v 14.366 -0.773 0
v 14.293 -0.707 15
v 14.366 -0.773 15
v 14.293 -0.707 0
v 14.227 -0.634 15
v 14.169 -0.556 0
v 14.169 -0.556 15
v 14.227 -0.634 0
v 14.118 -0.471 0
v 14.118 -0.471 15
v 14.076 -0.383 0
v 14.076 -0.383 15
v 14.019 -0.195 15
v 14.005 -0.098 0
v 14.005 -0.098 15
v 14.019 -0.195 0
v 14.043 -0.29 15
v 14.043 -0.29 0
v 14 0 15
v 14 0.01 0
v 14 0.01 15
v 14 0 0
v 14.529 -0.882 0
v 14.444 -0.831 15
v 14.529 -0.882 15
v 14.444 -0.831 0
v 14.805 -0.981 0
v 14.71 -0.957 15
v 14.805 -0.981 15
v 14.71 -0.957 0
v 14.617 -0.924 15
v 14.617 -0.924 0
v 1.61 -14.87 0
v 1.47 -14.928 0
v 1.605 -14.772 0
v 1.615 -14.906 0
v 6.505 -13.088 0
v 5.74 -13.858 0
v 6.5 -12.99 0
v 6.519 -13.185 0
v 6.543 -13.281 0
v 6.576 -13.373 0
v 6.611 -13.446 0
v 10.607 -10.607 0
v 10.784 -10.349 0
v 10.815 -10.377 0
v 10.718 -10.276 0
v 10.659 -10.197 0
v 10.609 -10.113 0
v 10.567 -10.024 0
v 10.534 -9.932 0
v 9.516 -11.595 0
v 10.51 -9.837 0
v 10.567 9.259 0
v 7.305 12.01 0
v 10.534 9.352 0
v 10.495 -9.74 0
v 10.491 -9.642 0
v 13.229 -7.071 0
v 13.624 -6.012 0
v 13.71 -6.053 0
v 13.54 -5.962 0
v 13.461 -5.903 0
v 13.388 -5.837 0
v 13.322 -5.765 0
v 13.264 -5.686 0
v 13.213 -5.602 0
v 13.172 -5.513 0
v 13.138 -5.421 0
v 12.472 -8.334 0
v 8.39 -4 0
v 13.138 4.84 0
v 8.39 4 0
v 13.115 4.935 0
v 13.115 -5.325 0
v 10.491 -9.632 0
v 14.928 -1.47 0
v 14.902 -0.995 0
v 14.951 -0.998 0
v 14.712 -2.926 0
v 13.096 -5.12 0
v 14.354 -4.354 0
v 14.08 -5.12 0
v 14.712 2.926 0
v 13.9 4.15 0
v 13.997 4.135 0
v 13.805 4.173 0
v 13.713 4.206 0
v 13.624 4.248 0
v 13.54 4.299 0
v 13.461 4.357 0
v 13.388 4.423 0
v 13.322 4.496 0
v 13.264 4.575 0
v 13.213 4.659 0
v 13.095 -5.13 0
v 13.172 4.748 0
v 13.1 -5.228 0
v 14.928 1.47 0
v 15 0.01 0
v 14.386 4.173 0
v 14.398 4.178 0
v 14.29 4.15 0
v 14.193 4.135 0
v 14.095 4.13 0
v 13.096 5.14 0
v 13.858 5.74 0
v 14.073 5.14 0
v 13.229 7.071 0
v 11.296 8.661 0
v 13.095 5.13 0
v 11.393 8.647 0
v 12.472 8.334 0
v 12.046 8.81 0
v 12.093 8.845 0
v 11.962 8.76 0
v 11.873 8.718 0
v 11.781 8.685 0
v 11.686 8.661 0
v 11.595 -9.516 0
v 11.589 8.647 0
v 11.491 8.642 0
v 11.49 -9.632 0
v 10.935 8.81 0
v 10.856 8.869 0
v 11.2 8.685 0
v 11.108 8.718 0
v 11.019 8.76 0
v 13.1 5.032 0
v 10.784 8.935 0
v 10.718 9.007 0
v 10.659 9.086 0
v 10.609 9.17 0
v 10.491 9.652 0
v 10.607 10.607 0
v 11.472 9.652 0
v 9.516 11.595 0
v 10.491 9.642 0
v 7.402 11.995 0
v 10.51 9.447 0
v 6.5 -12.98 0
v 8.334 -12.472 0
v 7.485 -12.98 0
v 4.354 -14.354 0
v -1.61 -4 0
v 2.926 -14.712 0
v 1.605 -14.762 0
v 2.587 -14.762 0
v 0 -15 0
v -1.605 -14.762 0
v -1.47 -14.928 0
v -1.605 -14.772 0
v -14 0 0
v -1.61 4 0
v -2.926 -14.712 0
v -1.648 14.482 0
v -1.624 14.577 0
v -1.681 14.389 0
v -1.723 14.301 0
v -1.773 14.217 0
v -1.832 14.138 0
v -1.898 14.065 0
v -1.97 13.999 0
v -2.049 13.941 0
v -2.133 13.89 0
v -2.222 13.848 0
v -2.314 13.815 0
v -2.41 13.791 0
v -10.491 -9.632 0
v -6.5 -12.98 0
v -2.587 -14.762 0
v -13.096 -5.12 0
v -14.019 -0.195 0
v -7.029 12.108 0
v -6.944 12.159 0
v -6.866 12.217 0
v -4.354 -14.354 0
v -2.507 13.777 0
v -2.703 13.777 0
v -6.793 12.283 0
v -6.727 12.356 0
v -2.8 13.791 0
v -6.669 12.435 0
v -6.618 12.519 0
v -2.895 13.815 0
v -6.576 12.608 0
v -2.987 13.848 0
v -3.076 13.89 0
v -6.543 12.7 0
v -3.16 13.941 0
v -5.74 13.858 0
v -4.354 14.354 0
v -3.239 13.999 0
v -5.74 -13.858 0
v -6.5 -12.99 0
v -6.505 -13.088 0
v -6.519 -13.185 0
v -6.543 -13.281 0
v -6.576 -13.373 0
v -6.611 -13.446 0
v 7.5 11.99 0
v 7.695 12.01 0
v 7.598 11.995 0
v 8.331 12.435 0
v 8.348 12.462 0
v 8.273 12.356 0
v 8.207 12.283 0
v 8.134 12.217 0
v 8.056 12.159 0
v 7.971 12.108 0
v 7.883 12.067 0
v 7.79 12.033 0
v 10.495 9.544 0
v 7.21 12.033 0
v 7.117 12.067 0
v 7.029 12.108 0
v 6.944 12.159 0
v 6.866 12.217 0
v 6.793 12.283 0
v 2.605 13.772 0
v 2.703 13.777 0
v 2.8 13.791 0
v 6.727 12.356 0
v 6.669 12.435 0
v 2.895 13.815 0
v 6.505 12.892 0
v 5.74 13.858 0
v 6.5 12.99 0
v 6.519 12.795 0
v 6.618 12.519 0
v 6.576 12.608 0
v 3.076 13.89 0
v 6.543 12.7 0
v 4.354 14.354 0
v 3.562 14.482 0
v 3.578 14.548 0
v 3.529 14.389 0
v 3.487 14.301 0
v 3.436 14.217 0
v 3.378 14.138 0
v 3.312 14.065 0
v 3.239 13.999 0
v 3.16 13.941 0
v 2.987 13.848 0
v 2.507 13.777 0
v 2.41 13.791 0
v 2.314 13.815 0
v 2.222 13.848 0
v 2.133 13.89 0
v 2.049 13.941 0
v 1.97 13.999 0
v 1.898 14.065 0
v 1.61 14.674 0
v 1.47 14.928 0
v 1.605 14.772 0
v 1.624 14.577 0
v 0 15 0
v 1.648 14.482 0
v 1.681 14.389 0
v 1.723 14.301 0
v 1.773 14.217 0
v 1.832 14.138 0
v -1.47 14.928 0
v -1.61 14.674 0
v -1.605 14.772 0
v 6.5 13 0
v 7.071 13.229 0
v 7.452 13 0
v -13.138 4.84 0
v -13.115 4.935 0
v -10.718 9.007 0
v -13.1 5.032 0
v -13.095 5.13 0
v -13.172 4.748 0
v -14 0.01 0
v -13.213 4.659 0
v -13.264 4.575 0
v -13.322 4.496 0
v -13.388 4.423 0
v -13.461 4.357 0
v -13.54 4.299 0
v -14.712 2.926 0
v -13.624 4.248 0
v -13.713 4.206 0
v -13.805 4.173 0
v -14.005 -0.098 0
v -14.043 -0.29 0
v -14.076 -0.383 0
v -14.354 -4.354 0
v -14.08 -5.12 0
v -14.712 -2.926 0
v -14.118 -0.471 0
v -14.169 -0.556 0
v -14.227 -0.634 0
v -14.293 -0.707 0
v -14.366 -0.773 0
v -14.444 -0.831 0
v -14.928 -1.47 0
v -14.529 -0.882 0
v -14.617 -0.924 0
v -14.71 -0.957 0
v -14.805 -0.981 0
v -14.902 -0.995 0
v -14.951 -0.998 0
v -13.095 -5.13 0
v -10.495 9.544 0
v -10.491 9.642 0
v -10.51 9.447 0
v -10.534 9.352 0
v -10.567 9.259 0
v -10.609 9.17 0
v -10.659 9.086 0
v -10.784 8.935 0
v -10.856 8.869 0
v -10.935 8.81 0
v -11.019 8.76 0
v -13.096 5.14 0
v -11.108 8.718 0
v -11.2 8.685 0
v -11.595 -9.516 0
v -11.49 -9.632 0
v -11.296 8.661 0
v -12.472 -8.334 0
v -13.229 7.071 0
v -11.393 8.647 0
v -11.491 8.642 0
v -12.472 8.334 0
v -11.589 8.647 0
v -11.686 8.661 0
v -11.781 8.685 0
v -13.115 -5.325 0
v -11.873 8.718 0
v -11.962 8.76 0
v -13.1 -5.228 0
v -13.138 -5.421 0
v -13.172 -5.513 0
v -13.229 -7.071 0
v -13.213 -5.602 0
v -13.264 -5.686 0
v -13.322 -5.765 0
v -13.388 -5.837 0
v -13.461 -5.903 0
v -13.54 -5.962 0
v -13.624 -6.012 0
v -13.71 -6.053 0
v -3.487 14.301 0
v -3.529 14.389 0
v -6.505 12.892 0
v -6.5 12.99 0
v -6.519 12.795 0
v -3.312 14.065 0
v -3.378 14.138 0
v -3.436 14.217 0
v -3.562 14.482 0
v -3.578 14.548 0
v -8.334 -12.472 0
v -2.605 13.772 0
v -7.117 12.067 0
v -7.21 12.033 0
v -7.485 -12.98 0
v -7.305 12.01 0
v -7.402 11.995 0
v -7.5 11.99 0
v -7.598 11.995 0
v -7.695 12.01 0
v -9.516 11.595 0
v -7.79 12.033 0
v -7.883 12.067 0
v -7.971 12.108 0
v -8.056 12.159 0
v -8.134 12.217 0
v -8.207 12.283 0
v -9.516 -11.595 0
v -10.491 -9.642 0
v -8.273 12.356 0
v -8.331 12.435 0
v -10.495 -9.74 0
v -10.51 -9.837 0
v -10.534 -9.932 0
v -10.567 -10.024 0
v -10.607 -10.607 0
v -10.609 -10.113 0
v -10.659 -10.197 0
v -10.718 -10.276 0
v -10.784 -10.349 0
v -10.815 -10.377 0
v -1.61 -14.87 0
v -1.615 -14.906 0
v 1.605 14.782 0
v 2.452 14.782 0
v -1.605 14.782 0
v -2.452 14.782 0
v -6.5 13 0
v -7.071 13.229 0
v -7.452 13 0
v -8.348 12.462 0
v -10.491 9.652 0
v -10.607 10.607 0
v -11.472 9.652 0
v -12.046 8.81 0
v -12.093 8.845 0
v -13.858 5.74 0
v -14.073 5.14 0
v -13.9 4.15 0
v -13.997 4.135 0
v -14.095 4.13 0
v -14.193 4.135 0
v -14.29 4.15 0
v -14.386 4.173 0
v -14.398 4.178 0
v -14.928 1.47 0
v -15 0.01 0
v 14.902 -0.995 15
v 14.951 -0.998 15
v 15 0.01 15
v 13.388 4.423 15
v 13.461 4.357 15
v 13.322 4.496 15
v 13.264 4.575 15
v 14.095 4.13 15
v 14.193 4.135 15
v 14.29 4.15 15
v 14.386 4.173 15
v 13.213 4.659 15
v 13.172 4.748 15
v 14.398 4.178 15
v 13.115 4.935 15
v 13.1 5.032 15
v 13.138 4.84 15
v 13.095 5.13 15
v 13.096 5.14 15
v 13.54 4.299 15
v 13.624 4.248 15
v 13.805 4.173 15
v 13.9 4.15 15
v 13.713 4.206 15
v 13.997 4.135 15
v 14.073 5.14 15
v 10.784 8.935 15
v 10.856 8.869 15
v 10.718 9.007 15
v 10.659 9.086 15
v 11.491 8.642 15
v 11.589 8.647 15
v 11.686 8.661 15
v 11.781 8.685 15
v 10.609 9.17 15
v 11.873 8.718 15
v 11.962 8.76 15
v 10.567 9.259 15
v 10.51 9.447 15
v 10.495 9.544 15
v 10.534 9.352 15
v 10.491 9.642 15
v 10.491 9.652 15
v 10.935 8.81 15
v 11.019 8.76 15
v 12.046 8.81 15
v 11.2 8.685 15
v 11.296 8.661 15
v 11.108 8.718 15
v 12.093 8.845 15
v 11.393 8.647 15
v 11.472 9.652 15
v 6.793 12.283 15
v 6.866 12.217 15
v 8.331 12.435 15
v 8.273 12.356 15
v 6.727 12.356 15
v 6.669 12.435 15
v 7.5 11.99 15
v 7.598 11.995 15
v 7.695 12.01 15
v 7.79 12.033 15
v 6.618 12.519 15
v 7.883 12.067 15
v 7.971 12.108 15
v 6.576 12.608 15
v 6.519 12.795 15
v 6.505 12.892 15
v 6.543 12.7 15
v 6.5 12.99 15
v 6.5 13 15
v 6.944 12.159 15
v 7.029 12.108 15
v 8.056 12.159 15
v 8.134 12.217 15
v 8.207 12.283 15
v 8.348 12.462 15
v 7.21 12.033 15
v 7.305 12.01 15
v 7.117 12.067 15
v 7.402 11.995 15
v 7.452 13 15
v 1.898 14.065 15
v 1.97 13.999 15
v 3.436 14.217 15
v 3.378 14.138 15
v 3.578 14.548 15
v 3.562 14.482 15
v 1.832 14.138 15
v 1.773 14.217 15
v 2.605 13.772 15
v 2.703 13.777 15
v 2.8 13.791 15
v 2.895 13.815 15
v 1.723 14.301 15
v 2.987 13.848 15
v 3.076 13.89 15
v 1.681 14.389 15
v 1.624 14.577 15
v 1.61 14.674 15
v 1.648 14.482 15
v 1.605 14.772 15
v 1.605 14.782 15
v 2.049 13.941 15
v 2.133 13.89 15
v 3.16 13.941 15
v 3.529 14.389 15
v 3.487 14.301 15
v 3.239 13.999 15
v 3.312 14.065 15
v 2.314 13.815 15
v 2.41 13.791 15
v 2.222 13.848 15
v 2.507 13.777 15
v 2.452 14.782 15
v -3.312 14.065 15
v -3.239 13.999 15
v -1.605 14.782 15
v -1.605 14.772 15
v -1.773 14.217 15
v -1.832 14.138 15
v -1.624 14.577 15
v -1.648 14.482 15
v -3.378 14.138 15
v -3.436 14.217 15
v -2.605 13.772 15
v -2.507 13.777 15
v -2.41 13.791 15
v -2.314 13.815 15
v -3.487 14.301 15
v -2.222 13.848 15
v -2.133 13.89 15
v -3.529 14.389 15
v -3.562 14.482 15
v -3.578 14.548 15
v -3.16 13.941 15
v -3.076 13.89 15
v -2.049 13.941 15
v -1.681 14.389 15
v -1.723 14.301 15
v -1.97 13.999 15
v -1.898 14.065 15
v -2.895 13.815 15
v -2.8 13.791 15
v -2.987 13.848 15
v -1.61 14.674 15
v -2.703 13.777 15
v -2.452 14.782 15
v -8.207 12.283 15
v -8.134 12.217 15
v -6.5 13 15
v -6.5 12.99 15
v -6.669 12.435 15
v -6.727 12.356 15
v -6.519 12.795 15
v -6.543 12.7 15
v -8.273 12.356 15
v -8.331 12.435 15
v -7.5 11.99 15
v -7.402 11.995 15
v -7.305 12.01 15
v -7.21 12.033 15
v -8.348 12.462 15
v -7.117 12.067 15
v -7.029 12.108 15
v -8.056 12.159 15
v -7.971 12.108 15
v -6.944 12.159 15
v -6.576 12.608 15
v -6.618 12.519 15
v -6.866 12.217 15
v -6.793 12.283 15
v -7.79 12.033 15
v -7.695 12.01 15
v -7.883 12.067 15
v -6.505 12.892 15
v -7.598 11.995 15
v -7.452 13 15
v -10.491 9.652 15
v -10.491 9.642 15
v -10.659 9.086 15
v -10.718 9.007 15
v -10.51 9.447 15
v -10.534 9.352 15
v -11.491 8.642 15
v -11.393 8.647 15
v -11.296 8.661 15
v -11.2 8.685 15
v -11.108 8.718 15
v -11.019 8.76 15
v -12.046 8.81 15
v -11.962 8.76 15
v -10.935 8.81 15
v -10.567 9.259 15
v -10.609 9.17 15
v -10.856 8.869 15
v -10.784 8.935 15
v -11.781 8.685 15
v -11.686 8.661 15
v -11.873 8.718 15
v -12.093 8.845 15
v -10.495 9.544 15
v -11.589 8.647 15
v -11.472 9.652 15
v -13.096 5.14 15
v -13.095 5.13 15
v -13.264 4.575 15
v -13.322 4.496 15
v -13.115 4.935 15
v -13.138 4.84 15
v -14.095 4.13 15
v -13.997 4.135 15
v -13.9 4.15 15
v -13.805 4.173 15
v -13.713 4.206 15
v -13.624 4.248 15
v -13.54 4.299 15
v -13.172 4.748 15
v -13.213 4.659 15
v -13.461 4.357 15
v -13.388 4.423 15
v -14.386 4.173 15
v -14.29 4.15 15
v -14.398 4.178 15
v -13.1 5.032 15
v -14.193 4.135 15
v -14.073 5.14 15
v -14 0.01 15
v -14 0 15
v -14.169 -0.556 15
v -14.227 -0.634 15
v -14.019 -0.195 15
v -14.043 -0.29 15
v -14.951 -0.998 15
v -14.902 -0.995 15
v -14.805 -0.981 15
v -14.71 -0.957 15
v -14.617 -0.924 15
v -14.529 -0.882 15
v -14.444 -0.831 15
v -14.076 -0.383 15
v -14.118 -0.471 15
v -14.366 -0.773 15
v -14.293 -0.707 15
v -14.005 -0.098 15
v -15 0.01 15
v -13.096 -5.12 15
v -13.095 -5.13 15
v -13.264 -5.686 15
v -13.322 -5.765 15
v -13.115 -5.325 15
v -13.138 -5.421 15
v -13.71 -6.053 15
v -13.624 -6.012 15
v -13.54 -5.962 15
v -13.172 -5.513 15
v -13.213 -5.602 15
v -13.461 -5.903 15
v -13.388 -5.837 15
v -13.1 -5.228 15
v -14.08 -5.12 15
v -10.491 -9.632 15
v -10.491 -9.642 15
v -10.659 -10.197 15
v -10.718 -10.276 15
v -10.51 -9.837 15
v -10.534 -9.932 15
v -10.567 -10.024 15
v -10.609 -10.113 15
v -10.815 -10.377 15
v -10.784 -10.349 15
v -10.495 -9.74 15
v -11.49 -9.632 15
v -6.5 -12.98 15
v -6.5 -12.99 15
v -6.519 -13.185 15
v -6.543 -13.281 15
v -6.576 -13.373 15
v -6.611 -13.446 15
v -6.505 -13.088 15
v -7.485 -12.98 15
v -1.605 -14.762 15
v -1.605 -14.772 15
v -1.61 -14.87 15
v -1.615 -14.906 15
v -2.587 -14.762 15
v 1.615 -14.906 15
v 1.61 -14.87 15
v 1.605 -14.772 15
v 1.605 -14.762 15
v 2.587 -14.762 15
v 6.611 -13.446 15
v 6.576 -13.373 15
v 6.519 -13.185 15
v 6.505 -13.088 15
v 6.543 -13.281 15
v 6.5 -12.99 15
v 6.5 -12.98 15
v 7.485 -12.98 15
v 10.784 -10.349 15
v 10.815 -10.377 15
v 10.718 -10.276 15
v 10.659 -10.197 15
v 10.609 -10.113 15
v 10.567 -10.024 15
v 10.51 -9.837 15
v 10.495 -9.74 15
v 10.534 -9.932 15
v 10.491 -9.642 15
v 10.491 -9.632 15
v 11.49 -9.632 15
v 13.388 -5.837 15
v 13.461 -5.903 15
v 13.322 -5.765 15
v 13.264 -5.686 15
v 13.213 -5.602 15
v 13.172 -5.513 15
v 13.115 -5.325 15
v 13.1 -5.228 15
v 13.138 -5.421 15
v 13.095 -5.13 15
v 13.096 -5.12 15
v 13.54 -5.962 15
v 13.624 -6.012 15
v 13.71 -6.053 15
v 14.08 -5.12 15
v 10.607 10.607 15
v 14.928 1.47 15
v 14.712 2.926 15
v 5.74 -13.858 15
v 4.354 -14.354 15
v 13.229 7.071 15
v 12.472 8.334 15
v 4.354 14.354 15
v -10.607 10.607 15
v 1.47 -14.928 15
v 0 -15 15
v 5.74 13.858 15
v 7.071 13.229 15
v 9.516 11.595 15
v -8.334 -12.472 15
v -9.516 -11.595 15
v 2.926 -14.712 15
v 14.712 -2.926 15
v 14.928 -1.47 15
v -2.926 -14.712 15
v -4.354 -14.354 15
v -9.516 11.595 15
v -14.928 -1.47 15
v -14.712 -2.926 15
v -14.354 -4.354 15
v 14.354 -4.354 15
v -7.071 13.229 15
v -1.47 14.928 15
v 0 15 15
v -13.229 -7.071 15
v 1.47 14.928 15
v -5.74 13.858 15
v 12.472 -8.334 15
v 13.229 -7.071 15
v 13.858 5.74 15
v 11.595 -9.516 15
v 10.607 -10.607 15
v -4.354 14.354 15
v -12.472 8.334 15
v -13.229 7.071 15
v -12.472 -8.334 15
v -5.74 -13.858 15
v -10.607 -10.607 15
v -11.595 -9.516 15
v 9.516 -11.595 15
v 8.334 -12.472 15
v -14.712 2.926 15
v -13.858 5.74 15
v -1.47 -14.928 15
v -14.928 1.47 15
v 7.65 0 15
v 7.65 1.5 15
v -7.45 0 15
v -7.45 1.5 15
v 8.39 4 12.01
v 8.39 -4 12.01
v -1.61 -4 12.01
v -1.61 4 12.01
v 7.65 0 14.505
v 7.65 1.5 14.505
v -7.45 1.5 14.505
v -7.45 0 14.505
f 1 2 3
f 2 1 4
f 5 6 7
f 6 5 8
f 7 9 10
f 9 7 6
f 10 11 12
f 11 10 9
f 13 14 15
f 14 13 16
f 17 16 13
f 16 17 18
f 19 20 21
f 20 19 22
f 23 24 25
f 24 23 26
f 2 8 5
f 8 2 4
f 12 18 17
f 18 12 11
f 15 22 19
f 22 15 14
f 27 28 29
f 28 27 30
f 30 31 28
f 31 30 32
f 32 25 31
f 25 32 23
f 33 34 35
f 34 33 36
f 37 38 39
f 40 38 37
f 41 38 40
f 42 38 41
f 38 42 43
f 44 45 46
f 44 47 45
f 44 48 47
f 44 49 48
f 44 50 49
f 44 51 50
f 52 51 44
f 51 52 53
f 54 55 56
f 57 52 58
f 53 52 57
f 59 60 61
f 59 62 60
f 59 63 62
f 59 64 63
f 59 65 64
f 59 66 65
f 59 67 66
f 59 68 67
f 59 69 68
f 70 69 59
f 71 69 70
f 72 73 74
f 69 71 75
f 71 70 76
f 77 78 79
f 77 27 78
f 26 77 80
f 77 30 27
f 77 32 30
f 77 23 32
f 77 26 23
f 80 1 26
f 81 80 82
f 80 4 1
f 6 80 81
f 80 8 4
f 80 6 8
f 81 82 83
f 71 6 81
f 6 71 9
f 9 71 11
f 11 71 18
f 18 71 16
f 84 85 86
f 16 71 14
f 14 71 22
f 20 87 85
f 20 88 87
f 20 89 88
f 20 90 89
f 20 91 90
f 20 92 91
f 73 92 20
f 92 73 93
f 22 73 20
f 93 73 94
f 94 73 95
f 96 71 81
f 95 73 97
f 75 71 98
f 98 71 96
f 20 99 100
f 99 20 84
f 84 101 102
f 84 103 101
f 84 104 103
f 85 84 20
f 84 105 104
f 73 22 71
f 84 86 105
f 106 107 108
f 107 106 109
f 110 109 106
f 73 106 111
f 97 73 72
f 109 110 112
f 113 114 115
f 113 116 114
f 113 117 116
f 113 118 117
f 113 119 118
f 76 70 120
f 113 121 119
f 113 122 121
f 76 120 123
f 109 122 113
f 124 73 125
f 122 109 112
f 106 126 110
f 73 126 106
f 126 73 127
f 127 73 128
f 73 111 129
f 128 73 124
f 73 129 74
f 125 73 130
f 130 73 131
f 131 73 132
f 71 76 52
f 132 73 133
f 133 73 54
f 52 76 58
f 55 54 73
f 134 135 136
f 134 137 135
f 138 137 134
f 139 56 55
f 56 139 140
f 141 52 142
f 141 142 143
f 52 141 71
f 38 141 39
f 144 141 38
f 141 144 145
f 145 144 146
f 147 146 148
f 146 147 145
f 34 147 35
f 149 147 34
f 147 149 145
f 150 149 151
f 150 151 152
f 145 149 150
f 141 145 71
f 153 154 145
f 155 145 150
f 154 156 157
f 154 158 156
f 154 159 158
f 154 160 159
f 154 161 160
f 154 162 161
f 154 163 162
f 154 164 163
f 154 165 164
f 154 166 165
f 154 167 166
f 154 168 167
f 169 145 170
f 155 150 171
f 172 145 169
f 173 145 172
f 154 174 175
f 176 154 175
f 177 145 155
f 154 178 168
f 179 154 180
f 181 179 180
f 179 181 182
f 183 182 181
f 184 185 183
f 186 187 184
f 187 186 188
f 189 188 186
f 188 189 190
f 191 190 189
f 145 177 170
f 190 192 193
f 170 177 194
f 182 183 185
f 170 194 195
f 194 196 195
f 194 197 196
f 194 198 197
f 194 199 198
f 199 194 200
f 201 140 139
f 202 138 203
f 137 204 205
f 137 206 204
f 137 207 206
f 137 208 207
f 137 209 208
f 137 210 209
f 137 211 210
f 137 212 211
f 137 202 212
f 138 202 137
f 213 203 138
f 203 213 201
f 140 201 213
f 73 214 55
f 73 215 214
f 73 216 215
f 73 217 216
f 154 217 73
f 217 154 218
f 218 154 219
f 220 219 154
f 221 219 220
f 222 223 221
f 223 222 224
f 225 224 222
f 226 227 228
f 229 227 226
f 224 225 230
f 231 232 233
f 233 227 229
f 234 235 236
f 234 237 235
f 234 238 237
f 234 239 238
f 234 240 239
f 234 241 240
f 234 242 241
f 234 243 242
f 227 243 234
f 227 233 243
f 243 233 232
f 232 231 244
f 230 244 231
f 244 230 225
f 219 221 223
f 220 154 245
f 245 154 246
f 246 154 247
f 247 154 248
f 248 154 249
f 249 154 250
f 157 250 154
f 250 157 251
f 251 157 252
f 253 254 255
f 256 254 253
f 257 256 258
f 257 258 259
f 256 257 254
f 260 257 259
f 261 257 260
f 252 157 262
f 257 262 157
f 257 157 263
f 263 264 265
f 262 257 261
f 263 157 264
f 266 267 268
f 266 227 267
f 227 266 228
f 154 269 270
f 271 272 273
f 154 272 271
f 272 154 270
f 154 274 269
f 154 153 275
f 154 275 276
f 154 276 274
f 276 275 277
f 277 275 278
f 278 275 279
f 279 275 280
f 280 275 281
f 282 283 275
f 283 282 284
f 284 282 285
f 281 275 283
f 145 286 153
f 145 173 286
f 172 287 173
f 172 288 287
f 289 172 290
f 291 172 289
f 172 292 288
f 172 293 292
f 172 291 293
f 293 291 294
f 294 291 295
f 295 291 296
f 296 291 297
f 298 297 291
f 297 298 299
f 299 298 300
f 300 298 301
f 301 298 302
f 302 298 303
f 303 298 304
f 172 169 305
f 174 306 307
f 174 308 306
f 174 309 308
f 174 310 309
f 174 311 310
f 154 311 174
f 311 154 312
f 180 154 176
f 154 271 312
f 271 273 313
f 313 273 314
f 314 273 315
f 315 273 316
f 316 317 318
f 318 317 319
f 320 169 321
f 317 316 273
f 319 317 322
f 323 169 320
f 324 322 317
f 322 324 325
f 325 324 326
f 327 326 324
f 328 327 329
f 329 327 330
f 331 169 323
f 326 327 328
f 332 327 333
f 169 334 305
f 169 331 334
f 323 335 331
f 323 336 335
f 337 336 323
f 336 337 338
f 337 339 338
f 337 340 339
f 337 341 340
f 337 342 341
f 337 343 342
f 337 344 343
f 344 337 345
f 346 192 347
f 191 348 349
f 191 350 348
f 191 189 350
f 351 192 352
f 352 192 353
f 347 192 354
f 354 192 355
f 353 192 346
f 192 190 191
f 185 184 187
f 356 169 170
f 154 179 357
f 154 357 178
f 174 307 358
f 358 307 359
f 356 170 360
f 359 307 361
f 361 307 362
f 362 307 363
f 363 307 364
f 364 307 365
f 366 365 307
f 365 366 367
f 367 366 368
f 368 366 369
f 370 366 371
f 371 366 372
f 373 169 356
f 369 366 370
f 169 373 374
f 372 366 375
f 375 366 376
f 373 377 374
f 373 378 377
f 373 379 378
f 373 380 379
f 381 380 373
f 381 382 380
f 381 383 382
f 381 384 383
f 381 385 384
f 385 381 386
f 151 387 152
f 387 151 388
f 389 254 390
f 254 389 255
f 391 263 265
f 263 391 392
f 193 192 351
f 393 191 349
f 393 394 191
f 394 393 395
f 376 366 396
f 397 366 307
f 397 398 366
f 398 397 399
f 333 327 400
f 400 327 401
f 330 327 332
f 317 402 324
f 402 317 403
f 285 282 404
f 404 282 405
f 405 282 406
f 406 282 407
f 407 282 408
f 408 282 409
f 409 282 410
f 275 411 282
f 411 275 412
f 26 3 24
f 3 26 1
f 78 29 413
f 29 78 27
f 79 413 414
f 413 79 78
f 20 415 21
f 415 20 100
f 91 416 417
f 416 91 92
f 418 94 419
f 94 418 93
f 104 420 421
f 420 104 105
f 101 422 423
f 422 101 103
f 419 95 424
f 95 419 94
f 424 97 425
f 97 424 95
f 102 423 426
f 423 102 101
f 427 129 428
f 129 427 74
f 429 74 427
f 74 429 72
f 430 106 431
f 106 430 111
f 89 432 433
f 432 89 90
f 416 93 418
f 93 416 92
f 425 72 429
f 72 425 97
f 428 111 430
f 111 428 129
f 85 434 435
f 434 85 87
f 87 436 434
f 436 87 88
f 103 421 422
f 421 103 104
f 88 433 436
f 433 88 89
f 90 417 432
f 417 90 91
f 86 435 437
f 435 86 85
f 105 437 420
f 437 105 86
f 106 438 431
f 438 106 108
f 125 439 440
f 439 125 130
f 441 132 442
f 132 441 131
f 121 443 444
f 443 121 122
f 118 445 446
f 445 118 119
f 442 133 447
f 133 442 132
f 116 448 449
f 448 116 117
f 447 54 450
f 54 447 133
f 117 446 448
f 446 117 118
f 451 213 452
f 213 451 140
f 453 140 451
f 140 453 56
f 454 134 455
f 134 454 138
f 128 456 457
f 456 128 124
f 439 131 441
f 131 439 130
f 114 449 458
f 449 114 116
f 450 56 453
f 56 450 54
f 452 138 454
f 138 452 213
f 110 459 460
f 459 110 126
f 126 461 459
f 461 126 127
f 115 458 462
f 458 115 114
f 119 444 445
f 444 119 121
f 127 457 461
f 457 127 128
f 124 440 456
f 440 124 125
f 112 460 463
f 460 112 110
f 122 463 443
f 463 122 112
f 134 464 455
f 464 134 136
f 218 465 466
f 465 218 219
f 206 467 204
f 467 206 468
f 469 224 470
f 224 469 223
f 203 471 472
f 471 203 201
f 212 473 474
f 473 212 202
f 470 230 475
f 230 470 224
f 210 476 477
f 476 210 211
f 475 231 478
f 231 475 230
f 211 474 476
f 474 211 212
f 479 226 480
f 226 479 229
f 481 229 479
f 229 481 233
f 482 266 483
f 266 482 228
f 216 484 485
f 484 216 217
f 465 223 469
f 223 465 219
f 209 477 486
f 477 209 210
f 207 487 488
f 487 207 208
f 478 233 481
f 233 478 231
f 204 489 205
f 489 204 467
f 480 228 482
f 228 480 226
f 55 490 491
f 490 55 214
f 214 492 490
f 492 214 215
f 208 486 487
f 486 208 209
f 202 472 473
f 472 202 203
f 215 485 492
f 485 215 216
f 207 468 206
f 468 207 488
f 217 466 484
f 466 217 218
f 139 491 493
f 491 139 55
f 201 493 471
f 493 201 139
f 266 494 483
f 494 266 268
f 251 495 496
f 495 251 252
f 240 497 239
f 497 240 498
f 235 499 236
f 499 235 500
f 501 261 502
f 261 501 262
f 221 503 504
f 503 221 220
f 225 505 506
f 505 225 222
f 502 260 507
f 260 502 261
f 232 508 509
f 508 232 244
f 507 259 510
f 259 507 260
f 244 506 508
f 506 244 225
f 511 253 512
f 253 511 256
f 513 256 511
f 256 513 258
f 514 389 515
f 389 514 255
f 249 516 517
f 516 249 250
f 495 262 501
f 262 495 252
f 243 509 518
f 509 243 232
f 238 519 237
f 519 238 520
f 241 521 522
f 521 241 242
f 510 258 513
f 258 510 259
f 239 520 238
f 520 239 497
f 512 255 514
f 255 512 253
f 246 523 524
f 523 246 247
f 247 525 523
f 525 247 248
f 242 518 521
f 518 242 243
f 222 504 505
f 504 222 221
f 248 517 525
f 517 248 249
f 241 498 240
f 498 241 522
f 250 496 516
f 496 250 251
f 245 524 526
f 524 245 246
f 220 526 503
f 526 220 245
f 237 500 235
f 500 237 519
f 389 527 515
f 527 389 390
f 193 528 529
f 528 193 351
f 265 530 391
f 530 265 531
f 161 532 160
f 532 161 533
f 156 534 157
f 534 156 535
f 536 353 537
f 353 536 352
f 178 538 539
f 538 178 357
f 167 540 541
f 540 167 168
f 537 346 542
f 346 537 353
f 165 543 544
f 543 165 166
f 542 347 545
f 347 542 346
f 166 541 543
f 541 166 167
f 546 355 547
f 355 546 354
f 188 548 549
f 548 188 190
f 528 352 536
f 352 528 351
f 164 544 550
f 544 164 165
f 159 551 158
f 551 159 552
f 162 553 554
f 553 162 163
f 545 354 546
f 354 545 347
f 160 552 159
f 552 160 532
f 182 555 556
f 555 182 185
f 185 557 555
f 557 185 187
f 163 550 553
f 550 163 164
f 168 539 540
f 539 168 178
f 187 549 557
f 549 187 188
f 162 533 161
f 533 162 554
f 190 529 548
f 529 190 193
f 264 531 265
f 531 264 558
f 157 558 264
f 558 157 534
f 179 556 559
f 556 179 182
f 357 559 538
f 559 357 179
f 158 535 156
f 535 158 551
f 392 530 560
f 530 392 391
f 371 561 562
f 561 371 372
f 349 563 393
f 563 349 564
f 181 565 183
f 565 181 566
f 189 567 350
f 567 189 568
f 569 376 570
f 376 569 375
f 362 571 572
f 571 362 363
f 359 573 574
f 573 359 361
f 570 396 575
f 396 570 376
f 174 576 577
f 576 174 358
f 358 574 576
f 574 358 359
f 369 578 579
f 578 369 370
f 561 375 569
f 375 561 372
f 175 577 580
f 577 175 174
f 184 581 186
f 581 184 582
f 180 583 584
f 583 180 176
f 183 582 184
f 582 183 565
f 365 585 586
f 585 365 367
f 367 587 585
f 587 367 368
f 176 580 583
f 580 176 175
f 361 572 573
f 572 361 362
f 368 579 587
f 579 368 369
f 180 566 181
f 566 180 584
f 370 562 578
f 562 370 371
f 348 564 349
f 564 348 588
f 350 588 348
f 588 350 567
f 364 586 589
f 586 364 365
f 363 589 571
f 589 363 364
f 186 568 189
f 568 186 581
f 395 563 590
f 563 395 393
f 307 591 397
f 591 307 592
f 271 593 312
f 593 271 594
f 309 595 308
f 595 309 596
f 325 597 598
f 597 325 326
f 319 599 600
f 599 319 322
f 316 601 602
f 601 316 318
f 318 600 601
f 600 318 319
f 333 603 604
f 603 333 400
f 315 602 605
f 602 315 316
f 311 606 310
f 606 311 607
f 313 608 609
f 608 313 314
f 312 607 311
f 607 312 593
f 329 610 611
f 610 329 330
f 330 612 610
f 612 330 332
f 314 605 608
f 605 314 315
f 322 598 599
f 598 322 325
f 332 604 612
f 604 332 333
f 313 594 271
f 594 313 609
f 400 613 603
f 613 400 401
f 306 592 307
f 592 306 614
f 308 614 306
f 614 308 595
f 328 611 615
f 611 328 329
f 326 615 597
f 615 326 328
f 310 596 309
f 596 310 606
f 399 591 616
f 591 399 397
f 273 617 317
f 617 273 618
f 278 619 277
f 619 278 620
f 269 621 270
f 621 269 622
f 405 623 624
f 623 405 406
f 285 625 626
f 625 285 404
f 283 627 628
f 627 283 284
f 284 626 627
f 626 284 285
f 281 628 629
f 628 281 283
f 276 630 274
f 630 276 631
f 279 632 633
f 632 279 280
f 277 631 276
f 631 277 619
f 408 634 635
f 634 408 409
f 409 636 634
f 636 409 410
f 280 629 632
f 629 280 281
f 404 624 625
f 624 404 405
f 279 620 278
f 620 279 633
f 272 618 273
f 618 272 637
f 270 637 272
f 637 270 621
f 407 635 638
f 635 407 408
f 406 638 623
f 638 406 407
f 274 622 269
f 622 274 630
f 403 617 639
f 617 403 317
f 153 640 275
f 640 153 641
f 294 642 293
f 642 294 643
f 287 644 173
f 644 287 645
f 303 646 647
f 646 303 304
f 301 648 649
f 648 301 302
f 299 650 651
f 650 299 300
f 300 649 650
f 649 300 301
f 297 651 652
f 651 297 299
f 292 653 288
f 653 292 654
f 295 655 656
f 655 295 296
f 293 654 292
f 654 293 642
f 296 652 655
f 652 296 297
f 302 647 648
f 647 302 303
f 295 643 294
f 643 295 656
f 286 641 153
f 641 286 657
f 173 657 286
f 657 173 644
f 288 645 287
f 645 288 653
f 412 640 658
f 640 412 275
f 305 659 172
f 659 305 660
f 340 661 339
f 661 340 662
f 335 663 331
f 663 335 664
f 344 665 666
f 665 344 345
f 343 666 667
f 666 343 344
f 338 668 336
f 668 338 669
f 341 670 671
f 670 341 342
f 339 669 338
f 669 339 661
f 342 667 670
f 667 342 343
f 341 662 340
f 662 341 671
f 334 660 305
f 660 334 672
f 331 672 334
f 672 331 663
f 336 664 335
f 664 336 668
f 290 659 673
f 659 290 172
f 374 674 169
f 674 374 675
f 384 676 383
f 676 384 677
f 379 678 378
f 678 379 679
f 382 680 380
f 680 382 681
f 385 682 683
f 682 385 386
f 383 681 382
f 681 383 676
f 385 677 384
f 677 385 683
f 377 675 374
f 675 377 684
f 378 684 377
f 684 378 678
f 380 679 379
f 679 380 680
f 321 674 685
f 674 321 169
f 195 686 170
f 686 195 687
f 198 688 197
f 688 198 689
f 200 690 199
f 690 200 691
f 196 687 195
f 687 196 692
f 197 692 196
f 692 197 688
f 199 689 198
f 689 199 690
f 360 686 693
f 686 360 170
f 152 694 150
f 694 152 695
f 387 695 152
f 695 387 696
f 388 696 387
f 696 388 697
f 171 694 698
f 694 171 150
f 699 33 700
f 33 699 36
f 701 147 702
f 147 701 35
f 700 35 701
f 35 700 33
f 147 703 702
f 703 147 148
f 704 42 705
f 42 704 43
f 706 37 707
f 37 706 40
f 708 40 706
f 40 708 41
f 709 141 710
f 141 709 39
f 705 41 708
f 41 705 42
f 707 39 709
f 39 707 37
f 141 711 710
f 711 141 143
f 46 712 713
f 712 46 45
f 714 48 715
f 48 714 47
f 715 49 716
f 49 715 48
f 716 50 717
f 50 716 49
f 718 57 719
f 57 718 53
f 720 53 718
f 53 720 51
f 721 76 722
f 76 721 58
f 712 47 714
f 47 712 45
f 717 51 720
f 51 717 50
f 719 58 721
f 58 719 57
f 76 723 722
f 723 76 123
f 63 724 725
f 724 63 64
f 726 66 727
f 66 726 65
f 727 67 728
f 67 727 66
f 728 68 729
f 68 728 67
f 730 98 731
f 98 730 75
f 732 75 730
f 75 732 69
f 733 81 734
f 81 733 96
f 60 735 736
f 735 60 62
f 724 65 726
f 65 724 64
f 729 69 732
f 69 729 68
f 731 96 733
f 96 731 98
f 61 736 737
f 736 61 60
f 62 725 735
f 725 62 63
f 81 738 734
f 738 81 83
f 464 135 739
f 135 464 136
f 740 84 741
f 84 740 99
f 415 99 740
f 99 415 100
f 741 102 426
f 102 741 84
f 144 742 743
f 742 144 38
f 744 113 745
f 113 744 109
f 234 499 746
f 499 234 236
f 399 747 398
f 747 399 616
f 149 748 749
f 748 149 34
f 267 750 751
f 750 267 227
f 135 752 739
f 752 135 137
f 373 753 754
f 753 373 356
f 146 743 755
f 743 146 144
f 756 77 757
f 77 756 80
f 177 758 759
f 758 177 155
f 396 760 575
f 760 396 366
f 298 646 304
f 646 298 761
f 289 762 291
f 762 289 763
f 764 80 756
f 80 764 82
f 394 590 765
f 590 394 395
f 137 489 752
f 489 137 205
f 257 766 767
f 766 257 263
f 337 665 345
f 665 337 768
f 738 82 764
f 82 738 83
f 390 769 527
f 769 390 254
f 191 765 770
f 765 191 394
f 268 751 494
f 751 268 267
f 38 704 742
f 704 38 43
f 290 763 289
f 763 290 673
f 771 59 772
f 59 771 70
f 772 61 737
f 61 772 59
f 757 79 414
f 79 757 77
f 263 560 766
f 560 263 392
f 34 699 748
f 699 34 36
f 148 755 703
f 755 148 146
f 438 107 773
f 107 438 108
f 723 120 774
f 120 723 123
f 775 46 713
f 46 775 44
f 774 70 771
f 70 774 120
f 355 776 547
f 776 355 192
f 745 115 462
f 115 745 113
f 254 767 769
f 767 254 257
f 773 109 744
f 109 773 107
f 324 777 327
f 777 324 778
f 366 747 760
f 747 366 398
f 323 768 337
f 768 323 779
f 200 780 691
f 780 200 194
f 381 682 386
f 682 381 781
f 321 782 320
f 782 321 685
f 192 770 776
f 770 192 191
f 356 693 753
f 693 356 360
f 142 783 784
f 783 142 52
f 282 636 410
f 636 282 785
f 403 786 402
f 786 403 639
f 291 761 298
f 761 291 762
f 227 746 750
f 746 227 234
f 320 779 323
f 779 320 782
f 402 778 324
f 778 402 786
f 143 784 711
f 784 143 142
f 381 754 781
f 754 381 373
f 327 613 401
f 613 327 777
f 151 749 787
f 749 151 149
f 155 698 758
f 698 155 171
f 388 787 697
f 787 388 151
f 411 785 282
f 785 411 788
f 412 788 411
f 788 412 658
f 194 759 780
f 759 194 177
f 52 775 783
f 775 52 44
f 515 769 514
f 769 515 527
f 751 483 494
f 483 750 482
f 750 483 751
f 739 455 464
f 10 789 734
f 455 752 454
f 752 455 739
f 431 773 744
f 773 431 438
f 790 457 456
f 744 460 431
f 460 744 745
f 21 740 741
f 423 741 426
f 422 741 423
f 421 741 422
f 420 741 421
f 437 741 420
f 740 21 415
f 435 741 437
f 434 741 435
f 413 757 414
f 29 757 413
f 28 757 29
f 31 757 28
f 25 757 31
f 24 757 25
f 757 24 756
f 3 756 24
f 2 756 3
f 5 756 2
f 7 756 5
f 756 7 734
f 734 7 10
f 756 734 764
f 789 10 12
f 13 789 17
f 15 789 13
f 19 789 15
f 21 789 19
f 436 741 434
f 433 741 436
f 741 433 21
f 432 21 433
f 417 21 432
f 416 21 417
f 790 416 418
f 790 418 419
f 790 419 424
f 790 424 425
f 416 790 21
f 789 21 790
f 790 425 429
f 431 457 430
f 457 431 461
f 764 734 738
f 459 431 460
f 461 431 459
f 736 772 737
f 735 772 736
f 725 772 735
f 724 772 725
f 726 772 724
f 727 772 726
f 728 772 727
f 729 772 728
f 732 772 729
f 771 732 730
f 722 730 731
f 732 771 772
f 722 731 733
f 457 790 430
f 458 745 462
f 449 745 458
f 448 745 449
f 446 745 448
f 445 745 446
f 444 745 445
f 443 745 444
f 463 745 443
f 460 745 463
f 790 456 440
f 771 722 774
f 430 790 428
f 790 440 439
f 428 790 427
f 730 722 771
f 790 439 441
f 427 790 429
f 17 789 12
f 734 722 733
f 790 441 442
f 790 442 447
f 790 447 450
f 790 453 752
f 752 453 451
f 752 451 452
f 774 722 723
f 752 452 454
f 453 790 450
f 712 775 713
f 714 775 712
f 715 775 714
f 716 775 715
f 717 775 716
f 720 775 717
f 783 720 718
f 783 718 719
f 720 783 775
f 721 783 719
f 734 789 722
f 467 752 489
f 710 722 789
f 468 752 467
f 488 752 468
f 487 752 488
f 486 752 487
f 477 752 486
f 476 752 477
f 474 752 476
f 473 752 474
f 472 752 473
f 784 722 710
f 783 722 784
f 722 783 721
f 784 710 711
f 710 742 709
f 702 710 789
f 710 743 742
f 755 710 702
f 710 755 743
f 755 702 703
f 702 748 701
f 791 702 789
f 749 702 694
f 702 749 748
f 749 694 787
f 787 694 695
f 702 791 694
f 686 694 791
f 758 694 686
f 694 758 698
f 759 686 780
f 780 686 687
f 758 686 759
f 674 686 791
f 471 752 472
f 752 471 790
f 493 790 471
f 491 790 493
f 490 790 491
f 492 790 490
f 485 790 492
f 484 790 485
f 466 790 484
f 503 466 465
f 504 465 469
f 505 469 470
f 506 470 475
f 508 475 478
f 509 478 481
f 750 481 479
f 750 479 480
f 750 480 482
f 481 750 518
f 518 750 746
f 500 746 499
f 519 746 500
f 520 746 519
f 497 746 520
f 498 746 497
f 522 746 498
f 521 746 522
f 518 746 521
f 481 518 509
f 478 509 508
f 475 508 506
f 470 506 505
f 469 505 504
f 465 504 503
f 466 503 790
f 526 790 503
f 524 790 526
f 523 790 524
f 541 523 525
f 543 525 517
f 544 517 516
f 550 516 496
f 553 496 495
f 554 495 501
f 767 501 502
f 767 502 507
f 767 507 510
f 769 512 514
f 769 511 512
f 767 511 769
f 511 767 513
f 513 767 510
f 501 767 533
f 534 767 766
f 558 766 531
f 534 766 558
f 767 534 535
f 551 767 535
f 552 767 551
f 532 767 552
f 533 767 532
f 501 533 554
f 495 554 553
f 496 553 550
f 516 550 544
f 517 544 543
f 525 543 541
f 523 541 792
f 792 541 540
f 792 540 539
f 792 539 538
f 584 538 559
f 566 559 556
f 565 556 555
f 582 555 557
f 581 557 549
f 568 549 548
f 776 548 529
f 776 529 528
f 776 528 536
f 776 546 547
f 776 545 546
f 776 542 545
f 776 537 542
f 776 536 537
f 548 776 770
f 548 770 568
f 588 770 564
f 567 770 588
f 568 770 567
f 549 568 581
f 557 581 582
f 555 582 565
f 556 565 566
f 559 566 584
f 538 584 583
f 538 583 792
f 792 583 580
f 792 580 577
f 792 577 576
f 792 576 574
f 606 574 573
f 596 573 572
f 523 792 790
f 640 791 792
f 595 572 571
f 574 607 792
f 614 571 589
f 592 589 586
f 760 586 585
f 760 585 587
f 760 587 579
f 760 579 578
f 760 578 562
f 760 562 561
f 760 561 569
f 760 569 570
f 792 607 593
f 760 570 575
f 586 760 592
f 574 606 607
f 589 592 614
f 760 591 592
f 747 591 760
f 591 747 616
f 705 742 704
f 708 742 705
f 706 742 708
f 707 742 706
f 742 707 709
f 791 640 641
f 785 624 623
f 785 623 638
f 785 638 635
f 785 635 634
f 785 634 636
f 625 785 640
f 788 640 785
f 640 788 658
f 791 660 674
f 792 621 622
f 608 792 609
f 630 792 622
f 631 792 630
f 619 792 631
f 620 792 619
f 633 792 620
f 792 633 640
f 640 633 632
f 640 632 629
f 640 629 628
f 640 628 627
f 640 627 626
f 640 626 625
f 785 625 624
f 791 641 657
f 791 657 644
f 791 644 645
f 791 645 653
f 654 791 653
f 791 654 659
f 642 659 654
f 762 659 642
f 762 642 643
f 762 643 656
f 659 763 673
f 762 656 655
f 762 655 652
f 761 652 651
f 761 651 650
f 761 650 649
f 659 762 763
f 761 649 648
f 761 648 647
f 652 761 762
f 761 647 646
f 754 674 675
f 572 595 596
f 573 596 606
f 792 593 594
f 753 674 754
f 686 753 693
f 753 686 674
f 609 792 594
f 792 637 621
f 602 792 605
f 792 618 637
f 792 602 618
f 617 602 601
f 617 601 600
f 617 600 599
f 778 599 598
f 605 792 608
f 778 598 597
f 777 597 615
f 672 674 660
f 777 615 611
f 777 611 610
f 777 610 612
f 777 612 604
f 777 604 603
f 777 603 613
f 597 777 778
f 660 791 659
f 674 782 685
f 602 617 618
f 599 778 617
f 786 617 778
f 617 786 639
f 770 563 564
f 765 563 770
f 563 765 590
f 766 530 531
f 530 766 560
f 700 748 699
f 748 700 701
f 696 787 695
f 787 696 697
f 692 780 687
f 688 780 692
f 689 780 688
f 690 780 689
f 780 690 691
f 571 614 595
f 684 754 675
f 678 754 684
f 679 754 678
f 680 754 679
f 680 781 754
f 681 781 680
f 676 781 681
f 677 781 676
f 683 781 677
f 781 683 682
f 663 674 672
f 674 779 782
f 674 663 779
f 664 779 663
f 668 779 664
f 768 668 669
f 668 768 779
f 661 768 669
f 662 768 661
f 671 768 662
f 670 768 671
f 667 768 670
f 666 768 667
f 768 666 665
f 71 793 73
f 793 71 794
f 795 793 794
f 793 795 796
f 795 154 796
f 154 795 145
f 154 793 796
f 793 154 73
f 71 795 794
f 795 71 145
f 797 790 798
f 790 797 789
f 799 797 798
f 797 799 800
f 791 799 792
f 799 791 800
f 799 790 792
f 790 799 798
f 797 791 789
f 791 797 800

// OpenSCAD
$fn = 64;

// --- Dimensions ---
R_KNOB      = 15;       // Knob radius (30 mm diameter)
H_KNOB      = 15;       // Knob height
R_BORE      = 3.1;      // Bore radius (6.2 mm diameter)
H_BORE      = 12;       // Bore depth
X_FLAT      = -1.6;     // X position of D-shaft flat (3.1 - 4.7)
NUM_GROOVES = 18;       // Number of grip grooves
R_GROOVE    = 1;        // Groove radius (2 mm diameter)
W_POINTER   = 1.5;      // Pointer groove width
D_POINTER    = 1;        // Pointer groove depth

// --- Main Model ---
difference() {
    // Solid cylinder body
    cylinder(r=R_KNOB, h=H_KNOB, center=false);
    
    // D-shaped blind bore
    // Cuts the left side of the bore circle to create the flat face
    translate([X_FLAT - 0.01, -4, 0]) 
        cube([10, 8, H_BORE + 0.01]);
        
    // 18 evenly spaced grip grooves
    for (i = [0 : NUM_GROOVES - 1]) {
        theta = i * (360 / NUM_GROOVES);
        translate([R_KNOB * cos(theta), R_KNOB * sin(theta), 0]) {
            rotate([0, 0, 90]) {
                // Half-cylinder groove: flat face on +X, cuts inward
                difference() {
                    cylinder(r=R_GROOVE, h=H_KNOB + 0.01, center=false);
                    translate([0.01, -1, 0]) cube([10, 2, H_KNOB + 0.01]);
                }
            }
        }
    }
    
    // Pointer groove on top face
    // Spans from centre (x=0) to outer edge (x=-15), centered at x=-7.45
    translate([-7.45, 0, H_KNOB - D_POINTER + 0.505]) 
        cube([15.1, W_POINTER, D_POINTER + 0.01]);
}
